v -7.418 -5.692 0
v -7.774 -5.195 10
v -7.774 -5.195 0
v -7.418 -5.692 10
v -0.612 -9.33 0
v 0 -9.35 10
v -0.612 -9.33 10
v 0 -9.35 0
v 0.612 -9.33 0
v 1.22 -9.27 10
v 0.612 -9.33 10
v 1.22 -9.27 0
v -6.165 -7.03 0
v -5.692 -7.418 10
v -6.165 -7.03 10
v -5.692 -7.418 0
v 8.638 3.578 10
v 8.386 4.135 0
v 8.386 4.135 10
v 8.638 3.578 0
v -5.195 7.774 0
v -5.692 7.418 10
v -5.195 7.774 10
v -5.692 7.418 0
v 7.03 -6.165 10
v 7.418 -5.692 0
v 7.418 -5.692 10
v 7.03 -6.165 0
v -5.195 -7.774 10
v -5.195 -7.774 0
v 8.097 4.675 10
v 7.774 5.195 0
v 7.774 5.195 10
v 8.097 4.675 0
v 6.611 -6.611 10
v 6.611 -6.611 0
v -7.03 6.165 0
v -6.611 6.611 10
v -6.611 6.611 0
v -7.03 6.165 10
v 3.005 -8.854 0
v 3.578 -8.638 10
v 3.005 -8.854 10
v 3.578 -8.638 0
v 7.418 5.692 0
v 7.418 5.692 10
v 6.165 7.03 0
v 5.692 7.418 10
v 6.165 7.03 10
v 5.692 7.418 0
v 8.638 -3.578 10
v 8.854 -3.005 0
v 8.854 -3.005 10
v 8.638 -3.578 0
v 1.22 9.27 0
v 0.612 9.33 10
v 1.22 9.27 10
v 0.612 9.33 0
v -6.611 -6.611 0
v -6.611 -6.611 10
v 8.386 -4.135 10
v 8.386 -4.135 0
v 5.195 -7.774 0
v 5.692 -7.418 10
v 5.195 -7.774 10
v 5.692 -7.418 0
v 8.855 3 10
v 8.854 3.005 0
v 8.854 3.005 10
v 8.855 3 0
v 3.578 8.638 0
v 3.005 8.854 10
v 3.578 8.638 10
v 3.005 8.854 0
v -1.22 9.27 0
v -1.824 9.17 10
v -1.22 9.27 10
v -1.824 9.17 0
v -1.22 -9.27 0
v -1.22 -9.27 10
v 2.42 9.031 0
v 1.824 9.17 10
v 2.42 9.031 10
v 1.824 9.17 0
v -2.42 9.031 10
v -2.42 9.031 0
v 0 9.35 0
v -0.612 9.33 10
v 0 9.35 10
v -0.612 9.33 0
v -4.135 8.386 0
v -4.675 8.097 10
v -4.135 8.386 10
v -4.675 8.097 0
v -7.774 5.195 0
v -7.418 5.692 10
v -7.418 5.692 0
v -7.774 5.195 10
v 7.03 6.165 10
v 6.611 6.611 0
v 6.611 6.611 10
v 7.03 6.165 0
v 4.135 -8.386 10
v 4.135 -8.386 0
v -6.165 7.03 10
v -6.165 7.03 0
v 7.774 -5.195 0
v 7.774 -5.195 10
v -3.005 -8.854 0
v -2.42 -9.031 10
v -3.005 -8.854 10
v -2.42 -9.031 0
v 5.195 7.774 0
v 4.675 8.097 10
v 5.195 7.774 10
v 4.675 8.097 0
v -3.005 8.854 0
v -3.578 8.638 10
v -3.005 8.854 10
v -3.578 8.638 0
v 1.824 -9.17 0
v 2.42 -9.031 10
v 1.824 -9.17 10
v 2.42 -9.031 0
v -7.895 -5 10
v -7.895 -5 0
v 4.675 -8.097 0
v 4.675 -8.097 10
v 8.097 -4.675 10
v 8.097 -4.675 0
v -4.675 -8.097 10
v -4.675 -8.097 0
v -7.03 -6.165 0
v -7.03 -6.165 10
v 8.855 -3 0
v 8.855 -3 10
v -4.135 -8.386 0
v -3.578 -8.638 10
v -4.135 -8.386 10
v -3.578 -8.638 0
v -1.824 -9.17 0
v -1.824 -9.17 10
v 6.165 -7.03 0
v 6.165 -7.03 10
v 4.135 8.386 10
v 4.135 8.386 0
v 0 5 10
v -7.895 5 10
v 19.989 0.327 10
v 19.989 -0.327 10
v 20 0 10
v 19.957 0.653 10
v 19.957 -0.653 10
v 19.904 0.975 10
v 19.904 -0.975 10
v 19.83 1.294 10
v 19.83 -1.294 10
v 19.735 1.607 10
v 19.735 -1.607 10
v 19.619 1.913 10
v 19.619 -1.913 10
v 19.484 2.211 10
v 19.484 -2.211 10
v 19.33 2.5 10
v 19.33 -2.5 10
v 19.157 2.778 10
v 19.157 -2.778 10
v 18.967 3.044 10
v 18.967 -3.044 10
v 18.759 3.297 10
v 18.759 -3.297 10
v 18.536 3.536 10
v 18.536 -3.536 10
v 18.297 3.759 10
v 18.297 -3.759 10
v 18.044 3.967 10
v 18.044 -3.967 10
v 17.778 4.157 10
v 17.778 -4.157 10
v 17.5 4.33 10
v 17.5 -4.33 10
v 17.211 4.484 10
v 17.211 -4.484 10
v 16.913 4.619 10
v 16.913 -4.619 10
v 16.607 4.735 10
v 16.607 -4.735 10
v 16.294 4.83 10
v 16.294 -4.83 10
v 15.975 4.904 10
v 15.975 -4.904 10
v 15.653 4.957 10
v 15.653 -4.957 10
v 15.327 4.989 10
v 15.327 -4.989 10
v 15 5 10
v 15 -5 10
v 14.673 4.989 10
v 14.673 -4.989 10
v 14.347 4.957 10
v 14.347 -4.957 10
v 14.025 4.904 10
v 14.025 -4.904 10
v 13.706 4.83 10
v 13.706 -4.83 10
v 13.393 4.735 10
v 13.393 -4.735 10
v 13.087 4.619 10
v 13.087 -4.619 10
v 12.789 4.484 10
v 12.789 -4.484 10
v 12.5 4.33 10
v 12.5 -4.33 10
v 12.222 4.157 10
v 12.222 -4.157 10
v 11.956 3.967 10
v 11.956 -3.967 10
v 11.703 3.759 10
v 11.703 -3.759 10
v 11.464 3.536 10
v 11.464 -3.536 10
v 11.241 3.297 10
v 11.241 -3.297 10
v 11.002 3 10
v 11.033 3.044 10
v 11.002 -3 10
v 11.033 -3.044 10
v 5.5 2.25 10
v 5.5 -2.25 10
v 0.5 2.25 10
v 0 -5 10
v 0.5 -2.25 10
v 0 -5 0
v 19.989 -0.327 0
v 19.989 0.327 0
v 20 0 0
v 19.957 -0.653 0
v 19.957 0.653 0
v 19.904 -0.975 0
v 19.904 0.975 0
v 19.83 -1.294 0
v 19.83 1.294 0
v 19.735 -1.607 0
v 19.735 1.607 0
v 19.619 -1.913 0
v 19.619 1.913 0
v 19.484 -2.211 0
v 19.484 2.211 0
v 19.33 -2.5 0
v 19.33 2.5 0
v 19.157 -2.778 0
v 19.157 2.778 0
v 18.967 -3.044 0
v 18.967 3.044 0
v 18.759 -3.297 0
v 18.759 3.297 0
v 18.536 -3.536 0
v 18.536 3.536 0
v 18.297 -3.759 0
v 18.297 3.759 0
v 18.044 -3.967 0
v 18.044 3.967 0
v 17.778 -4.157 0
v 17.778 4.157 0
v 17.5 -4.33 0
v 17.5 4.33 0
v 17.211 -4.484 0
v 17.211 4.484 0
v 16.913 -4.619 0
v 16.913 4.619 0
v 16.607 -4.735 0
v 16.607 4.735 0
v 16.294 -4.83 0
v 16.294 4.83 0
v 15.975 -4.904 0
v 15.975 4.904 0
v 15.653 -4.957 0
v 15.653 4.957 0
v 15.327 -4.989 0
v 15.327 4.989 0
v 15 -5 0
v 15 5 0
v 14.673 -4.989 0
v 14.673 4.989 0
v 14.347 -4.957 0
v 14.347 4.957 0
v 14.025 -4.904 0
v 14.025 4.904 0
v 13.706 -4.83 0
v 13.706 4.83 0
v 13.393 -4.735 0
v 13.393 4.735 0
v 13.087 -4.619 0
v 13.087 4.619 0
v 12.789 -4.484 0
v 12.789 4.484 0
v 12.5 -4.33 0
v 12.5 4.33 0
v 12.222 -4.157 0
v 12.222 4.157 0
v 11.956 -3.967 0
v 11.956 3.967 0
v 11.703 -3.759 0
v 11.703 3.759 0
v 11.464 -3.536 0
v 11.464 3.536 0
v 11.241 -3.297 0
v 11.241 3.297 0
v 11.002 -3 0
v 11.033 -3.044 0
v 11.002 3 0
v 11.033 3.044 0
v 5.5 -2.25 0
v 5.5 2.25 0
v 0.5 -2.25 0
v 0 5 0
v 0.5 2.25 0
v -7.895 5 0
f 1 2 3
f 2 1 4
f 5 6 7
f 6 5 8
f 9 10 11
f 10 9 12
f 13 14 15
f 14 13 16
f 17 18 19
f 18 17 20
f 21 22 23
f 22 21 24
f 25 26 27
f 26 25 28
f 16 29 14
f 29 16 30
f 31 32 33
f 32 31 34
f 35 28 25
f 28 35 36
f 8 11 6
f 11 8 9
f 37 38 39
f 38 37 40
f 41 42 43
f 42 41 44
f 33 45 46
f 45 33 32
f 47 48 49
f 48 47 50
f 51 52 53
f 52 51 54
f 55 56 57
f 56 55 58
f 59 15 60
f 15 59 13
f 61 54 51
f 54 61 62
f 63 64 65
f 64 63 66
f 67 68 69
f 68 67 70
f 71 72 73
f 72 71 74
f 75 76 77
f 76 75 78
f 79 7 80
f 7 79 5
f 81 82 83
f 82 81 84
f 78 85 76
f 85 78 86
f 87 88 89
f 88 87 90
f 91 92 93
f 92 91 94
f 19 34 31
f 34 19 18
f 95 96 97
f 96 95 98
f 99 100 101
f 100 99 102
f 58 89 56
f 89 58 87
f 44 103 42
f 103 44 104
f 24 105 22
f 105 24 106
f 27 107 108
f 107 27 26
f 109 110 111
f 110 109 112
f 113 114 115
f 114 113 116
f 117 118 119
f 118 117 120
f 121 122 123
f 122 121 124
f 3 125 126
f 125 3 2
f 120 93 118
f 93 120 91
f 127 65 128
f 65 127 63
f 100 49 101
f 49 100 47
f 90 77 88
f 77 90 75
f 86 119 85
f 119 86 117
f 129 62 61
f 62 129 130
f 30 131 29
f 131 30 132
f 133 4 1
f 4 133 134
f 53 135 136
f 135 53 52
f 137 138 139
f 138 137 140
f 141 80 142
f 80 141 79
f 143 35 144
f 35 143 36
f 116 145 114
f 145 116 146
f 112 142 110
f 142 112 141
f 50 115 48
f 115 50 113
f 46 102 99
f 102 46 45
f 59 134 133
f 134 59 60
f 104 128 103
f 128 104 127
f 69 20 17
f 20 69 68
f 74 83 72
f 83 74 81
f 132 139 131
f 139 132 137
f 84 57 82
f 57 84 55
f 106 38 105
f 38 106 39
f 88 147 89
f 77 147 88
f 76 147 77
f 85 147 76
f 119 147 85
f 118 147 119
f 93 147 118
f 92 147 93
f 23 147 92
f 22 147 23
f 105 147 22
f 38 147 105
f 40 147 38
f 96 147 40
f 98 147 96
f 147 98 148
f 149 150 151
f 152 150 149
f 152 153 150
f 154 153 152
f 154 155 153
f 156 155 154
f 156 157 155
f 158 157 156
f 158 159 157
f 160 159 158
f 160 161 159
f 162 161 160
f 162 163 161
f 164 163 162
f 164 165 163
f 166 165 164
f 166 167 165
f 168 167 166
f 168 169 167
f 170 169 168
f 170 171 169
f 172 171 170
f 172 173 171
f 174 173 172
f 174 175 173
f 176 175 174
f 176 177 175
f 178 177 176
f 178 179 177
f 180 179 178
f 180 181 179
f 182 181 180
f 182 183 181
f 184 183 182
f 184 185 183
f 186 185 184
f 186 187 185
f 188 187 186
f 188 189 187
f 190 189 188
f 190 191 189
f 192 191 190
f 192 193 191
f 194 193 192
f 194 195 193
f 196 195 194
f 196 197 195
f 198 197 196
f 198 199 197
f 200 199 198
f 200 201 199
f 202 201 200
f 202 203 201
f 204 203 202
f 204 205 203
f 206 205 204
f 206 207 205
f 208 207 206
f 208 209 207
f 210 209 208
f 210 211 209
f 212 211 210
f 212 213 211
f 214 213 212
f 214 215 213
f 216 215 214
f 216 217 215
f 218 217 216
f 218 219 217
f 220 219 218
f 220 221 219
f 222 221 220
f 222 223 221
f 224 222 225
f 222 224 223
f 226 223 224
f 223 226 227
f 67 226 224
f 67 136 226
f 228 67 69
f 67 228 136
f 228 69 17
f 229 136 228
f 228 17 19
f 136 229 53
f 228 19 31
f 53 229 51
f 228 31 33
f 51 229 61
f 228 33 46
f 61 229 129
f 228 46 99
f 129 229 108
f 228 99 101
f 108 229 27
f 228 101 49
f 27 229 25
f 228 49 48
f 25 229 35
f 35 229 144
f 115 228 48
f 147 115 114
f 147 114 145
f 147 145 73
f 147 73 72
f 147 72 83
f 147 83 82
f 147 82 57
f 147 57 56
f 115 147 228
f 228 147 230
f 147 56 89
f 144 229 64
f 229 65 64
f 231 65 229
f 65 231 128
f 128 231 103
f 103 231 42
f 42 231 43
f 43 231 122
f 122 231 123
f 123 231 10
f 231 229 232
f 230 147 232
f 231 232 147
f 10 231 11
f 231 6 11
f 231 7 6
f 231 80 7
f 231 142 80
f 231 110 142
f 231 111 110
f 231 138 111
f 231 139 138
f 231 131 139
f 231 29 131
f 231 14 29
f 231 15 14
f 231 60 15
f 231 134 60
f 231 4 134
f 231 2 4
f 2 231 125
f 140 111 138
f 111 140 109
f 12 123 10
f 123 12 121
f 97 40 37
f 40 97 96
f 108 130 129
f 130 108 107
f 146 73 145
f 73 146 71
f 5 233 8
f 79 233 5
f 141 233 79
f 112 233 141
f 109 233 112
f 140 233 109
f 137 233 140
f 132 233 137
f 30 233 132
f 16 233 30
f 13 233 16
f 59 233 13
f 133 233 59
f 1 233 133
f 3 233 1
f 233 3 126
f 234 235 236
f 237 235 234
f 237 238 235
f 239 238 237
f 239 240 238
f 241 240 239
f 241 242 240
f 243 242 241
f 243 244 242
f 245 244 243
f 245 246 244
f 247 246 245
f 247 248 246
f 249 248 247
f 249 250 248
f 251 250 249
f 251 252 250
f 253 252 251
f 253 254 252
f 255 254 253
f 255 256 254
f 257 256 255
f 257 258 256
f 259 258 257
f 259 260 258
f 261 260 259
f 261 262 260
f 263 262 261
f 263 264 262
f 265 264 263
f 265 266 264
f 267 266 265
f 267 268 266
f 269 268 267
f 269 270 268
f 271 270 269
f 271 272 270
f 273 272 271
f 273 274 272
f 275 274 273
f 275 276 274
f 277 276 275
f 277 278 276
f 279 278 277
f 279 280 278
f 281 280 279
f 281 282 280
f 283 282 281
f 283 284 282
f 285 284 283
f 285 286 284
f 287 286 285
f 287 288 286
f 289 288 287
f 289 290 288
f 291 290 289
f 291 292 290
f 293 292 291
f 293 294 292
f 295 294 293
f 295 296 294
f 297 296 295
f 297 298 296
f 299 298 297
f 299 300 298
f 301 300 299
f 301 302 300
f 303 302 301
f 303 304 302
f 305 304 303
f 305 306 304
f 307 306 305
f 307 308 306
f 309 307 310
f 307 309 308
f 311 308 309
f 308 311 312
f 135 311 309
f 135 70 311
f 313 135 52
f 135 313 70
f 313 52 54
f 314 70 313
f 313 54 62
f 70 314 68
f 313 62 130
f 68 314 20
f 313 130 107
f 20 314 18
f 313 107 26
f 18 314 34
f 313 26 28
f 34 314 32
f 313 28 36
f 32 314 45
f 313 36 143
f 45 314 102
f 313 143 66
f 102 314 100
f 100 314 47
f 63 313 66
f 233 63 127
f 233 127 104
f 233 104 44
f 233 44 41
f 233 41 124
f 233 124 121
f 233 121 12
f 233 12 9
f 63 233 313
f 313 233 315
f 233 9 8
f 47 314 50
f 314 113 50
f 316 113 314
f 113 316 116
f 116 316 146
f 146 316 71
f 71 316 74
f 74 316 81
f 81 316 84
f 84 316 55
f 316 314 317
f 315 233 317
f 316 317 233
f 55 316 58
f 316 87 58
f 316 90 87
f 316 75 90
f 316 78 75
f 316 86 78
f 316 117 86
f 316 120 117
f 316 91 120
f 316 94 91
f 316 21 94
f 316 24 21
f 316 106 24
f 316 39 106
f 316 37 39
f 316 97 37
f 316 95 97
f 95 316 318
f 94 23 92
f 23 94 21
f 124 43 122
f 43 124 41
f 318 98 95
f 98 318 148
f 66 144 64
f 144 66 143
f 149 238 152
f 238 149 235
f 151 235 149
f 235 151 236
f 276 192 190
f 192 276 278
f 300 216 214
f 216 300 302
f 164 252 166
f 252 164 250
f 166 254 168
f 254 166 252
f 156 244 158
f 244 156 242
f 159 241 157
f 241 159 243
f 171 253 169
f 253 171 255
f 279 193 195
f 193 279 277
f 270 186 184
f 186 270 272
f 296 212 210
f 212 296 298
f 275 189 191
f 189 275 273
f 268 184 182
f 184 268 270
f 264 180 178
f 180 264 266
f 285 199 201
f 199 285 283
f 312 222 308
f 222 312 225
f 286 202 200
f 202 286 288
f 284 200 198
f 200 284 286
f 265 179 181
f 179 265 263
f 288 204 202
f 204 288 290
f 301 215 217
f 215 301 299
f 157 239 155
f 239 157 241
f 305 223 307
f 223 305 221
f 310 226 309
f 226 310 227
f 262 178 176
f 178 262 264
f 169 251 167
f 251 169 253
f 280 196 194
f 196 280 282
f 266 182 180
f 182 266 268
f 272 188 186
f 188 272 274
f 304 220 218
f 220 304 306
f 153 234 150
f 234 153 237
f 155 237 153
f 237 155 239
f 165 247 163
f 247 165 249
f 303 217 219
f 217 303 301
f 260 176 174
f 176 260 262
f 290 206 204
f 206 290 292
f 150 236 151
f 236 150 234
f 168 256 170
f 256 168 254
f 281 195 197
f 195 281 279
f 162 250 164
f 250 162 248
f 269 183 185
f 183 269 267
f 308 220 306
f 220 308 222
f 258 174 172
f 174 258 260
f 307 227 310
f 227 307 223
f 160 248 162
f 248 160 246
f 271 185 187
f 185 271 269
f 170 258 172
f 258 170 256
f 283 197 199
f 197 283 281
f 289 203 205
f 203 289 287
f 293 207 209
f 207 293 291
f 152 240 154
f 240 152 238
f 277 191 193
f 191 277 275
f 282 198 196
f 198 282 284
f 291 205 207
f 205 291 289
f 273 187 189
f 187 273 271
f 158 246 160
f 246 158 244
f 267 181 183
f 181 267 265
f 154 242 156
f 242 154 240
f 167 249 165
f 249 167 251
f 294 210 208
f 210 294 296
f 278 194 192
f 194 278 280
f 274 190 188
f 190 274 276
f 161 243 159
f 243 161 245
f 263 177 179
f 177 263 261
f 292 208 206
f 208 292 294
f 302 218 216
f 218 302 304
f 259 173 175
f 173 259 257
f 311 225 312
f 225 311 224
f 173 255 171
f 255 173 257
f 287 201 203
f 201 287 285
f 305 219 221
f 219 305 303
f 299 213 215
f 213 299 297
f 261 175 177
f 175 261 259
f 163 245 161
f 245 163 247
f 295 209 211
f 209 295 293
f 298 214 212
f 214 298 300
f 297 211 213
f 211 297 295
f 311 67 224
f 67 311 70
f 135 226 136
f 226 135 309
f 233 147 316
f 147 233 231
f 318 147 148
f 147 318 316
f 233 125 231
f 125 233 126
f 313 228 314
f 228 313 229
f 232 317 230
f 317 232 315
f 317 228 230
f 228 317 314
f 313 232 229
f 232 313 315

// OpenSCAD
// Snap-on tubing clip for 12.7 mm lab stand rod
// Print orientation: flat on bed, builds upward in +Z

// ---------- Dimensions (mm) ----------
stand_id     = 12.7;   // stand rod inner diameter
stand_wall   = 3;      // stand ring wall thickness
stand_od     = stand_id + 2 * stand_wall;  // 18.7 outer diameter of stand ring

tube_id      = 6;      // tubing inner diameter
tube_wall    = 2;      // tubing wall thickness
tube_od      = tube_id + 2 * tube_wall;    // 10 outer diameter of tubing ring

bridge_x0    = 8;      // bridge start (X)
bridge_x1    = 12;     // bridge end (X)
bridge_w     = 6;      // bridge width (Y)

stand_cut    = 10;     // stand ring opening width (-X side)
tube_cut     = 4.5;    // tubing ring opening width (+X side)

eps          = 0.5;    // cutter overshoot past faces
$fn          = 96;     // curve resolution

// ---------- Model ----------
difference() {
    union() {
        // Stand rod ring
        cylinder(d = stand_od, h = 10);

        // Tubing ring
        translate([15, 0, 0])
            cylinder(d = tube_od, h = 10);

        // Solid bridge
        translate([bridge_x0, -bridge_w / 2, 0])
            cube([bridge_x1 - bridge_x0, bridge_w, 10]);
    }

    // Stand ring opening
    translate([-stand_od / 2 - eps, -stand_cut / 2, -eps])
        cube([stand_od / 2 + eps, stand_cut, 10 + 2 * eps]);

    // Tubing ring opening
    translate([tube_od / 2 - tube_cut, -tube_cut / 2, -eps])
        cube([tube_cut + eps, tube_cut, 10 + 2 * eps]);
}
